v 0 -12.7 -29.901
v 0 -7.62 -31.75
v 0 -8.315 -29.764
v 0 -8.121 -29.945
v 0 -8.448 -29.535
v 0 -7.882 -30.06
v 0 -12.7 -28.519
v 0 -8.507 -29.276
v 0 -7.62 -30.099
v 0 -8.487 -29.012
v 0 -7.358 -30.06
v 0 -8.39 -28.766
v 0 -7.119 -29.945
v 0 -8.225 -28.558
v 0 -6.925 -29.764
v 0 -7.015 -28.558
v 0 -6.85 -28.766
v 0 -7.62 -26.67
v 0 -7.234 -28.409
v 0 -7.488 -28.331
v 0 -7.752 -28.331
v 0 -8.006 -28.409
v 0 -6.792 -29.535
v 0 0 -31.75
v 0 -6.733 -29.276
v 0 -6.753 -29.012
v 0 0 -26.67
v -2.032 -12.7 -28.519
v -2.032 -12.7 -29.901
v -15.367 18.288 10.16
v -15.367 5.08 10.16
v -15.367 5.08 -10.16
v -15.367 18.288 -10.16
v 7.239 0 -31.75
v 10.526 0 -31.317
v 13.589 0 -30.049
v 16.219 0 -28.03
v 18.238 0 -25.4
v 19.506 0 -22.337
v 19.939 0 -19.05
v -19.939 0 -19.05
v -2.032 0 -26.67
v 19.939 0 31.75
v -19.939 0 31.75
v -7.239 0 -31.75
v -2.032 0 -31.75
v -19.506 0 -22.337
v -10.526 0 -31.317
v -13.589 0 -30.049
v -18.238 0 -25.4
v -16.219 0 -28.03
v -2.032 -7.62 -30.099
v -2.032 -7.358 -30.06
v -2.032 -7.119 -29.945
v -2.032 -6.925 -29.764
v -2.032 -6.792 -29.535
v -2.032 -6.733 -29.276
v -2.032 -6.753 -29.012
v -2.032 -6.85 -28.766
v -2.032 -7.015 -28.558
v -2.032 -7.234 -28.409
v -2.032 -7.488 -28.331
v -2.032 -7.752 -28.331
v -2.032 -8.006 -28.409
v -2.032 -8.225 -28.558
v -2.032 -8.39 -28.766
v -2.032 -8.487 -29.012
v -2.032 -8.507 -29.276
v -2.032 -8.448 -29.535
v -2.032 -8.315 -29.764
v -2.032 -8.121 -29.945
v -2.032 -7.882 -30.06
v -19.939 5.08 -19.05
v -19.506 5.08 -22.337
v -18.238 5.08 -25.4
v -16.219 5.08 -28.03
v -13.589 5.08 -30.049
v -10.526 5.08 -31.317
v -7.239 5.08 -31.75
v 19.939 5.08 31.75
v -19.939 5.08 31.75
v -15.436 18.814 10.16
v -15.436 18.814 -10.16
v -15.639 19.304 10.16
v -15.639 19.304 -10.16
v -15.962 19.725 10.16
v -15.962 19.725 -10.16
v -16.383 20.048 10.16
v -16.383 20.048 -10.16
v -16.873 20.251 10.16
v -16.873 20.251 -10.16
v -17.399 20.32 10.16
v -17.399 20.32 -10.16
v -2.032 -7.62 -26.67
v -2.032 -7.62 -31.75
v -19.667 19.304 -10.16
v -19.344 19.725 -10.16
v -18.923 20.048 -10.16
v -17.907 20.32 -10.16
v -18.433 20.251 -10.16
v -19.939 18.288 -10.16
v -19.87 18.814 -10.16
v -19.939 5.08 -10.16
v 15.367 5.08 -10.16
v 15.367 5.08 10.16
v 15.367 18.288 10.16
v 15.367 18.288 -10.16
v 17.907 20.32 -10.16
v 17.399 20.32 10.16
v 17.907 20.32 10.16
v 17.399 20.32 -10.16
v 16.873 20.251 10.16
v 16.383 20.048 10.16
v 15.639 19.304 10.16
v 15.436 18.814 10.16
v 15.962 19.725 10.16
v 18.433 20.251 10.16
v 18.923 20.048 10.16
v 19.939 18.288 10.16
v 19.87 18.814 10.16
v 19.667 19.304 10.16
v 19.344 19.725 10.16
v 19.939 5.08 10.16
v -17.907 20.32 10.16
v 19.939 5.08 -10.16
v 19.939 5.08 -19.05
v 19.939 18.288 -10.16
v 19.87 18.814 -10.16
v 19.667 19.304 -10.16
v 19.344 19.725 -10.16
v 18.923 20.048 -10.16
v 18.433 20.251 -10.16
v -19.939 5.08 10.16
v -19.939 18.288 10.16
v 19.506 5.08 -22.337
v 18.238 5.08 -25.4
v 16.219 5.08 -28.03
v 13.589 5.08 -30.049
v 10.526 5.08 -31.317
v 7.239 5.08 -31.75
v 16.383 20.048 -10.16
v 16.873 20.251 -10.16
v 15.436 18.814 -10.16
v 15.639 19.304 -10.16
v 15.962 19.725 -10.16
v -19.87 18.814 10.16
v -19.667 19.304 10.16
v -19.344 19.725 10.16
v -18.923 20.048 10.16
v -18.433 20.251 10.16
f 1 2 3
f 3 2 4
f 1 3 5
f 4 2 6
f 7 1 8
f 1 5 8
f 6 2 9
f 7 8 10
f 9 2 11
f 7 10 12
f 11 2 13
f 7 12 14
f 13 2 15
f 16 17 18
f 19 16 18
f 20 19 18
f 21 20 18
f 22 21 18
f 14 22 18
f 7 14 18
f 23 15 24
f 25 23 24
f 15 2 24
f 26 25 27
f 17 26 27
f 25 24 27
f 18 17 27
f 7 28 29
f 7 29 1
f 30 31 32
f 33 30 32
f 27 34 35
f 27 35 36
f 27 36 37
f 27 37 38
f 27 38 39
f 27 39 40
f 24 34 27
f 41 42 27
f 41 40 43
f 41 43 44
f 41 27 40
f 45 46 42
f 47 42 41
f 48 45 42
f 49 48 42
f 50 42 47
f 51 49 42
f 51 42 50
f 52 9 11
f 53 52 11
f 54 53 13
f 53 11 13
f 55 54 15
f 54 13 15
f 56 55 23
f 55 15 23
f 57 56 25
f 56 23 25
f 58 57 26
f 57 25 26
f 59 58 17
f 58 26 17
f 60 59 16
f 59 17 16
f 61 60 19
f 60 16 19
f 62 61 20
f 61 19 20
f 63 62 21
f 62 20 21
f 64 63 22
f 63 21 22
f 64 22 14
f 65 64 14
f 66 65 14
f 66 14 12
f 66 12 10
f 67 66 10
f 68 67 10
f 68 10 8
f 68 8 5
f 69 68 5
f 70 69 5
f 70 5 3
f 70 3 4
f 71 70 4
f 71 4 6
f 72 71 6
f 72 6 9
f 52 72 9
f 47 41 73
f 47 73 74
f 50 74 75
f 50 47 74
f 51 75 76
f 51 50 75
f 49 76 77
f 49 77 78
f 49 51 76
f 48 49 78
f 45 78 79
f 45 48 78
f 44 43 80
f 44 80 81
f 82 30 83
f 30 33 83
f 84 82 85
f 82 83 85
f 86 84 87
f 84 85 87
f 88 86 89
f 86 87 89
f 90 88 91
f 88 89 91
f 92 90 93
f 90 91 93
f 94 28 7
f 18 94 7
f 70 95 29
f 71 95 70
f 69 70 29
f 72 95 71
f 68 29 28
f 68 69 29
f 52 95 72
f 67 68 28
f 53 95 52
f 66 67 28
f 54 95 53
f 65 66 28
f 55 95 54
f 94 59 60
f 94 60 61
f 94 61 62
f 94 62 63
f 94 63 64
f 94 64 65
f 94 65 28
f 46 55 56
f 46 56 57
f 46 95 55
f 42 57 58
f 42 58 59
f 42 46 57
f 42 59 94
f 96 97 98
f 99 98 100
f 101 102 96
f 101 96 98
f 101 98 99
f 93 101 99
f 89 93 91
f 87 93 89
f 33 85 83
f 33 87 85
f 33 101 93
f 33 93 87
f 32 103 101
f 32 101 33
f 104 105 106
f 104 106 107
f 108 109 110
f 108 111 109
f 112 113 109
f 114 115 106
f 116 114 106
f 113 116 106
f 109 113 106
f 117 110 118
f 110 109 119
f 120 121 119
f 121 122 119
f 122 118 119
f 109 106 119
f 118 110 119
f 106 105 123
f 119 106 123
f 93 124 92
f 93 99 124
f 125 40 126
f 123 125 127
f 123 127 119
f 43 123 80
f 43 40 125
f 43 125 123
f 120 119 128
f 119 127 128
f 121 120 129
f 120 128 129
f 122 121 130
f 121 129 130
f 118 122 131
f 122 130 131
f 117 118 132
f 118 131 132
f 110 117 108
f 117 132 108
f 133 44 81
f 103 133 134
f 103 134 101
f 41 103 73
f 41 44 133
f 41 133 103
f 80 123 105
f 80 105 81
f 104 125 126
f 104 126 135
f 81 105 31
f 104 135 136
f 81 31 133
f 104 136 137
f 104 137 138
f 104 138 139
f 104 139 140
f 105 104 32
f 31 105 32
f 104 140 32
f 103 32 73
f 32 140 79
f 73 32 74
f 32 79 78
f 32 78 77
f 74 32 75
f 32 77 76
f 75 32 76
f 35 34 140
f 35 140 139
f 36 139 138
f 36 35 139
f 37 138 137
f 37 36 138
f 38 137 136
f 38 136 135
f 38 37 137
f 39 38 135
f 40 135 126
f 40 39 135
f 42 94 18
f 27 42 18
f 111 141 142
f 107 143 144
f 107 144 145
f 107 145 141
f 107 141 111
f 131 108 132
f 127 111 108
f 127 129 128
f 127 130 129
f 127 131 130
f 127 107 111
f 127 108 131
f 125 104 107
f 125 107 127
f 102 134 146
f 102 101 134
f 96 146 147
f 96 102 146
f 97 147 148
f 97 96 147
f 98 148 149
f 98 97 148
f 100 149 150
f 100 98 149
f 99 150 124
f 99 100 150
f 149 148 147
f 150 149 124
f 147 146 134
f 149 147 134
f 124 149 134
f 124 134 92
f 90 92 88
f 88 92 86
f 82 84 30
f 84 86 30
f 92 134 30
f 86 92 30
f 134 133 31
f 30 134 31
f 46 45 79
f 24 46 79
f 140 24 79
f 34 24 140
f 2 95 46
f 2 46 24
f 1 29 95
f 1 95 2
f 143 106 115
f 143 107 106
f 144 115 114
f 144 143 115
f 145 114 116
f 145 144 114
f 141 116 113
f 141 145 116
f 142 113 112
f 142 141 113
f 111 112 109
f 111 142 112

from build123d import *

# Parameters (mm, degrees)
BOSS_EXTRUDE2_DEPTH         = 5.08
SKETCH3_W                   = 4.572
SKETCH3_H                   = 20.32
BOSS_EXTRUDE3_DEPTH         = 15.24
FILLET1_R                   = 2.032
SKETCH4_W                   = 2.032
SKETCH4_H                   = 5.08
TILT_SERVO_CONNECTION_DEPTH = 12.7
SKETCH5_R                   = 0.889
CUT_EXTRUDE1_DEPTH          = 12.7
CHAMFER1_SIZE               = 5.08
CHAMFER1_SIZE2              = 1.84896879
CHAMFER1_PART_2_SIZE        = 5.08
CHAMFER1_PART_2_SIZE2       = 1.84896879


with BuildPart() as part:
    # Sketch1 → Boss-Extrude2 (new body)
    with BuildSketch(Plane(origin=(0, 0, 0), x_dir=(1, 0, 0), z_dir=(0, 1, 0))):
        with BuildLine():
            Line((-7.239, 31.75), (7.239, 31.75))
            ThreePointArc((7.239, 31.75), (16.219256121, 28.030256121), (19.939, 19.05))
            Line((19.939, 19.05), (19.939, -31.75))
            Line((19.939, -31.75), (-19.939, -31.75))
            Line((-19.939, -31.75), (-19.939, 19.05))
            ThreePointArc((-19.939, 19.05), (-16.219256121, 28.030256121), (-7.239, 31.75))
        make_face()
    extrude(amount=BOSS_EXTRUDE2_DEPTH)

    # Sketch3 → Boss-Extrude3 (add)
    with BuildSketch(Plane(origin=(0, 5.08, 0), x_dir=(1, 0, 0), z_dir=(0, 1, 0))):
        with Locations((-17.653, 0)):
            Rectangle(SKETCH3_W, SKETCH3_H)
        with Locations((17.653, 0)):
            Rectangle(SKETCH3_W, SKETCH3_H)
    extrude(amount=BOSS_EXTRUDE3_DEPTH)

    # Fillet1
    fillet1_edges = [part.edges().sort_by_distance(p)[0] for p in [
        (-19.939, 20.32, 0),
        (-15.367, 20.32, 0),
        (19.939, 20.32, 0),
        (15.367, 20.32, 0),
    ]]
    fillet(fillet1_edges, radius=FILLET1_R)

    # Sketch4 → Tilt servo connection (add)
    with BuildSketch(Plane.XZ):
        with Locations((-1.016, -29.21)):
            Rectangle(SKETCH4_W, SKETCH4_H)
    extrude(amount=TILT_SERVO_CONNECTION_DEPTH)

    # Sketch5 → Cut-Extrude1 (cut)
    with BuildSketch(Plane(origin=(0, 0, 0), x_dir=(0, 0, -1), z_dir=(1, 0, 0))):
        with Locations((29.21, -7.62)):
            Circle(SKETCH5_R)
    extrude(amount=-CUT_EXTRUDE1_DEPTH, mode=Mode.SUBTRACT)

    # Chamfer1
    chamfer1_edges = [part.edges().sort_by_distance(p)[0] for p in [
        (-1.016, -12.7, -31.75),
    ]]
    chamfer1_side = [part.faces().sort_by_distance(p)[0] for p in [
        (-0.263896104, 0.230909091, -31.75),
    ]]
    chamfer(chamfer1_edges, length=CHAMFER1_SIZE, length2=CHAMFER1_SIZE2, reference=chamfer1_side[0])

    # Chamfer1 part 2
    chamfer1_part_2_edges = [part.edges().sort_by_distance(p)[0] for p in [
        (-1.016, -12.7, -26.67),
    ]]
    chamfer1_part_2_side = [part.faces().sort_by_distance(p)[0] for p in [
        (-1.016, -6.35, -26.67),
    ]]
    chamfer(chamfer1_part_2_edges, length=CHAMFER1_PART_2_SIZE, length2=CHAMFER1_PART_2_SIZE2, reference=chamfer1_part_2_side[0])


solid = part.part
